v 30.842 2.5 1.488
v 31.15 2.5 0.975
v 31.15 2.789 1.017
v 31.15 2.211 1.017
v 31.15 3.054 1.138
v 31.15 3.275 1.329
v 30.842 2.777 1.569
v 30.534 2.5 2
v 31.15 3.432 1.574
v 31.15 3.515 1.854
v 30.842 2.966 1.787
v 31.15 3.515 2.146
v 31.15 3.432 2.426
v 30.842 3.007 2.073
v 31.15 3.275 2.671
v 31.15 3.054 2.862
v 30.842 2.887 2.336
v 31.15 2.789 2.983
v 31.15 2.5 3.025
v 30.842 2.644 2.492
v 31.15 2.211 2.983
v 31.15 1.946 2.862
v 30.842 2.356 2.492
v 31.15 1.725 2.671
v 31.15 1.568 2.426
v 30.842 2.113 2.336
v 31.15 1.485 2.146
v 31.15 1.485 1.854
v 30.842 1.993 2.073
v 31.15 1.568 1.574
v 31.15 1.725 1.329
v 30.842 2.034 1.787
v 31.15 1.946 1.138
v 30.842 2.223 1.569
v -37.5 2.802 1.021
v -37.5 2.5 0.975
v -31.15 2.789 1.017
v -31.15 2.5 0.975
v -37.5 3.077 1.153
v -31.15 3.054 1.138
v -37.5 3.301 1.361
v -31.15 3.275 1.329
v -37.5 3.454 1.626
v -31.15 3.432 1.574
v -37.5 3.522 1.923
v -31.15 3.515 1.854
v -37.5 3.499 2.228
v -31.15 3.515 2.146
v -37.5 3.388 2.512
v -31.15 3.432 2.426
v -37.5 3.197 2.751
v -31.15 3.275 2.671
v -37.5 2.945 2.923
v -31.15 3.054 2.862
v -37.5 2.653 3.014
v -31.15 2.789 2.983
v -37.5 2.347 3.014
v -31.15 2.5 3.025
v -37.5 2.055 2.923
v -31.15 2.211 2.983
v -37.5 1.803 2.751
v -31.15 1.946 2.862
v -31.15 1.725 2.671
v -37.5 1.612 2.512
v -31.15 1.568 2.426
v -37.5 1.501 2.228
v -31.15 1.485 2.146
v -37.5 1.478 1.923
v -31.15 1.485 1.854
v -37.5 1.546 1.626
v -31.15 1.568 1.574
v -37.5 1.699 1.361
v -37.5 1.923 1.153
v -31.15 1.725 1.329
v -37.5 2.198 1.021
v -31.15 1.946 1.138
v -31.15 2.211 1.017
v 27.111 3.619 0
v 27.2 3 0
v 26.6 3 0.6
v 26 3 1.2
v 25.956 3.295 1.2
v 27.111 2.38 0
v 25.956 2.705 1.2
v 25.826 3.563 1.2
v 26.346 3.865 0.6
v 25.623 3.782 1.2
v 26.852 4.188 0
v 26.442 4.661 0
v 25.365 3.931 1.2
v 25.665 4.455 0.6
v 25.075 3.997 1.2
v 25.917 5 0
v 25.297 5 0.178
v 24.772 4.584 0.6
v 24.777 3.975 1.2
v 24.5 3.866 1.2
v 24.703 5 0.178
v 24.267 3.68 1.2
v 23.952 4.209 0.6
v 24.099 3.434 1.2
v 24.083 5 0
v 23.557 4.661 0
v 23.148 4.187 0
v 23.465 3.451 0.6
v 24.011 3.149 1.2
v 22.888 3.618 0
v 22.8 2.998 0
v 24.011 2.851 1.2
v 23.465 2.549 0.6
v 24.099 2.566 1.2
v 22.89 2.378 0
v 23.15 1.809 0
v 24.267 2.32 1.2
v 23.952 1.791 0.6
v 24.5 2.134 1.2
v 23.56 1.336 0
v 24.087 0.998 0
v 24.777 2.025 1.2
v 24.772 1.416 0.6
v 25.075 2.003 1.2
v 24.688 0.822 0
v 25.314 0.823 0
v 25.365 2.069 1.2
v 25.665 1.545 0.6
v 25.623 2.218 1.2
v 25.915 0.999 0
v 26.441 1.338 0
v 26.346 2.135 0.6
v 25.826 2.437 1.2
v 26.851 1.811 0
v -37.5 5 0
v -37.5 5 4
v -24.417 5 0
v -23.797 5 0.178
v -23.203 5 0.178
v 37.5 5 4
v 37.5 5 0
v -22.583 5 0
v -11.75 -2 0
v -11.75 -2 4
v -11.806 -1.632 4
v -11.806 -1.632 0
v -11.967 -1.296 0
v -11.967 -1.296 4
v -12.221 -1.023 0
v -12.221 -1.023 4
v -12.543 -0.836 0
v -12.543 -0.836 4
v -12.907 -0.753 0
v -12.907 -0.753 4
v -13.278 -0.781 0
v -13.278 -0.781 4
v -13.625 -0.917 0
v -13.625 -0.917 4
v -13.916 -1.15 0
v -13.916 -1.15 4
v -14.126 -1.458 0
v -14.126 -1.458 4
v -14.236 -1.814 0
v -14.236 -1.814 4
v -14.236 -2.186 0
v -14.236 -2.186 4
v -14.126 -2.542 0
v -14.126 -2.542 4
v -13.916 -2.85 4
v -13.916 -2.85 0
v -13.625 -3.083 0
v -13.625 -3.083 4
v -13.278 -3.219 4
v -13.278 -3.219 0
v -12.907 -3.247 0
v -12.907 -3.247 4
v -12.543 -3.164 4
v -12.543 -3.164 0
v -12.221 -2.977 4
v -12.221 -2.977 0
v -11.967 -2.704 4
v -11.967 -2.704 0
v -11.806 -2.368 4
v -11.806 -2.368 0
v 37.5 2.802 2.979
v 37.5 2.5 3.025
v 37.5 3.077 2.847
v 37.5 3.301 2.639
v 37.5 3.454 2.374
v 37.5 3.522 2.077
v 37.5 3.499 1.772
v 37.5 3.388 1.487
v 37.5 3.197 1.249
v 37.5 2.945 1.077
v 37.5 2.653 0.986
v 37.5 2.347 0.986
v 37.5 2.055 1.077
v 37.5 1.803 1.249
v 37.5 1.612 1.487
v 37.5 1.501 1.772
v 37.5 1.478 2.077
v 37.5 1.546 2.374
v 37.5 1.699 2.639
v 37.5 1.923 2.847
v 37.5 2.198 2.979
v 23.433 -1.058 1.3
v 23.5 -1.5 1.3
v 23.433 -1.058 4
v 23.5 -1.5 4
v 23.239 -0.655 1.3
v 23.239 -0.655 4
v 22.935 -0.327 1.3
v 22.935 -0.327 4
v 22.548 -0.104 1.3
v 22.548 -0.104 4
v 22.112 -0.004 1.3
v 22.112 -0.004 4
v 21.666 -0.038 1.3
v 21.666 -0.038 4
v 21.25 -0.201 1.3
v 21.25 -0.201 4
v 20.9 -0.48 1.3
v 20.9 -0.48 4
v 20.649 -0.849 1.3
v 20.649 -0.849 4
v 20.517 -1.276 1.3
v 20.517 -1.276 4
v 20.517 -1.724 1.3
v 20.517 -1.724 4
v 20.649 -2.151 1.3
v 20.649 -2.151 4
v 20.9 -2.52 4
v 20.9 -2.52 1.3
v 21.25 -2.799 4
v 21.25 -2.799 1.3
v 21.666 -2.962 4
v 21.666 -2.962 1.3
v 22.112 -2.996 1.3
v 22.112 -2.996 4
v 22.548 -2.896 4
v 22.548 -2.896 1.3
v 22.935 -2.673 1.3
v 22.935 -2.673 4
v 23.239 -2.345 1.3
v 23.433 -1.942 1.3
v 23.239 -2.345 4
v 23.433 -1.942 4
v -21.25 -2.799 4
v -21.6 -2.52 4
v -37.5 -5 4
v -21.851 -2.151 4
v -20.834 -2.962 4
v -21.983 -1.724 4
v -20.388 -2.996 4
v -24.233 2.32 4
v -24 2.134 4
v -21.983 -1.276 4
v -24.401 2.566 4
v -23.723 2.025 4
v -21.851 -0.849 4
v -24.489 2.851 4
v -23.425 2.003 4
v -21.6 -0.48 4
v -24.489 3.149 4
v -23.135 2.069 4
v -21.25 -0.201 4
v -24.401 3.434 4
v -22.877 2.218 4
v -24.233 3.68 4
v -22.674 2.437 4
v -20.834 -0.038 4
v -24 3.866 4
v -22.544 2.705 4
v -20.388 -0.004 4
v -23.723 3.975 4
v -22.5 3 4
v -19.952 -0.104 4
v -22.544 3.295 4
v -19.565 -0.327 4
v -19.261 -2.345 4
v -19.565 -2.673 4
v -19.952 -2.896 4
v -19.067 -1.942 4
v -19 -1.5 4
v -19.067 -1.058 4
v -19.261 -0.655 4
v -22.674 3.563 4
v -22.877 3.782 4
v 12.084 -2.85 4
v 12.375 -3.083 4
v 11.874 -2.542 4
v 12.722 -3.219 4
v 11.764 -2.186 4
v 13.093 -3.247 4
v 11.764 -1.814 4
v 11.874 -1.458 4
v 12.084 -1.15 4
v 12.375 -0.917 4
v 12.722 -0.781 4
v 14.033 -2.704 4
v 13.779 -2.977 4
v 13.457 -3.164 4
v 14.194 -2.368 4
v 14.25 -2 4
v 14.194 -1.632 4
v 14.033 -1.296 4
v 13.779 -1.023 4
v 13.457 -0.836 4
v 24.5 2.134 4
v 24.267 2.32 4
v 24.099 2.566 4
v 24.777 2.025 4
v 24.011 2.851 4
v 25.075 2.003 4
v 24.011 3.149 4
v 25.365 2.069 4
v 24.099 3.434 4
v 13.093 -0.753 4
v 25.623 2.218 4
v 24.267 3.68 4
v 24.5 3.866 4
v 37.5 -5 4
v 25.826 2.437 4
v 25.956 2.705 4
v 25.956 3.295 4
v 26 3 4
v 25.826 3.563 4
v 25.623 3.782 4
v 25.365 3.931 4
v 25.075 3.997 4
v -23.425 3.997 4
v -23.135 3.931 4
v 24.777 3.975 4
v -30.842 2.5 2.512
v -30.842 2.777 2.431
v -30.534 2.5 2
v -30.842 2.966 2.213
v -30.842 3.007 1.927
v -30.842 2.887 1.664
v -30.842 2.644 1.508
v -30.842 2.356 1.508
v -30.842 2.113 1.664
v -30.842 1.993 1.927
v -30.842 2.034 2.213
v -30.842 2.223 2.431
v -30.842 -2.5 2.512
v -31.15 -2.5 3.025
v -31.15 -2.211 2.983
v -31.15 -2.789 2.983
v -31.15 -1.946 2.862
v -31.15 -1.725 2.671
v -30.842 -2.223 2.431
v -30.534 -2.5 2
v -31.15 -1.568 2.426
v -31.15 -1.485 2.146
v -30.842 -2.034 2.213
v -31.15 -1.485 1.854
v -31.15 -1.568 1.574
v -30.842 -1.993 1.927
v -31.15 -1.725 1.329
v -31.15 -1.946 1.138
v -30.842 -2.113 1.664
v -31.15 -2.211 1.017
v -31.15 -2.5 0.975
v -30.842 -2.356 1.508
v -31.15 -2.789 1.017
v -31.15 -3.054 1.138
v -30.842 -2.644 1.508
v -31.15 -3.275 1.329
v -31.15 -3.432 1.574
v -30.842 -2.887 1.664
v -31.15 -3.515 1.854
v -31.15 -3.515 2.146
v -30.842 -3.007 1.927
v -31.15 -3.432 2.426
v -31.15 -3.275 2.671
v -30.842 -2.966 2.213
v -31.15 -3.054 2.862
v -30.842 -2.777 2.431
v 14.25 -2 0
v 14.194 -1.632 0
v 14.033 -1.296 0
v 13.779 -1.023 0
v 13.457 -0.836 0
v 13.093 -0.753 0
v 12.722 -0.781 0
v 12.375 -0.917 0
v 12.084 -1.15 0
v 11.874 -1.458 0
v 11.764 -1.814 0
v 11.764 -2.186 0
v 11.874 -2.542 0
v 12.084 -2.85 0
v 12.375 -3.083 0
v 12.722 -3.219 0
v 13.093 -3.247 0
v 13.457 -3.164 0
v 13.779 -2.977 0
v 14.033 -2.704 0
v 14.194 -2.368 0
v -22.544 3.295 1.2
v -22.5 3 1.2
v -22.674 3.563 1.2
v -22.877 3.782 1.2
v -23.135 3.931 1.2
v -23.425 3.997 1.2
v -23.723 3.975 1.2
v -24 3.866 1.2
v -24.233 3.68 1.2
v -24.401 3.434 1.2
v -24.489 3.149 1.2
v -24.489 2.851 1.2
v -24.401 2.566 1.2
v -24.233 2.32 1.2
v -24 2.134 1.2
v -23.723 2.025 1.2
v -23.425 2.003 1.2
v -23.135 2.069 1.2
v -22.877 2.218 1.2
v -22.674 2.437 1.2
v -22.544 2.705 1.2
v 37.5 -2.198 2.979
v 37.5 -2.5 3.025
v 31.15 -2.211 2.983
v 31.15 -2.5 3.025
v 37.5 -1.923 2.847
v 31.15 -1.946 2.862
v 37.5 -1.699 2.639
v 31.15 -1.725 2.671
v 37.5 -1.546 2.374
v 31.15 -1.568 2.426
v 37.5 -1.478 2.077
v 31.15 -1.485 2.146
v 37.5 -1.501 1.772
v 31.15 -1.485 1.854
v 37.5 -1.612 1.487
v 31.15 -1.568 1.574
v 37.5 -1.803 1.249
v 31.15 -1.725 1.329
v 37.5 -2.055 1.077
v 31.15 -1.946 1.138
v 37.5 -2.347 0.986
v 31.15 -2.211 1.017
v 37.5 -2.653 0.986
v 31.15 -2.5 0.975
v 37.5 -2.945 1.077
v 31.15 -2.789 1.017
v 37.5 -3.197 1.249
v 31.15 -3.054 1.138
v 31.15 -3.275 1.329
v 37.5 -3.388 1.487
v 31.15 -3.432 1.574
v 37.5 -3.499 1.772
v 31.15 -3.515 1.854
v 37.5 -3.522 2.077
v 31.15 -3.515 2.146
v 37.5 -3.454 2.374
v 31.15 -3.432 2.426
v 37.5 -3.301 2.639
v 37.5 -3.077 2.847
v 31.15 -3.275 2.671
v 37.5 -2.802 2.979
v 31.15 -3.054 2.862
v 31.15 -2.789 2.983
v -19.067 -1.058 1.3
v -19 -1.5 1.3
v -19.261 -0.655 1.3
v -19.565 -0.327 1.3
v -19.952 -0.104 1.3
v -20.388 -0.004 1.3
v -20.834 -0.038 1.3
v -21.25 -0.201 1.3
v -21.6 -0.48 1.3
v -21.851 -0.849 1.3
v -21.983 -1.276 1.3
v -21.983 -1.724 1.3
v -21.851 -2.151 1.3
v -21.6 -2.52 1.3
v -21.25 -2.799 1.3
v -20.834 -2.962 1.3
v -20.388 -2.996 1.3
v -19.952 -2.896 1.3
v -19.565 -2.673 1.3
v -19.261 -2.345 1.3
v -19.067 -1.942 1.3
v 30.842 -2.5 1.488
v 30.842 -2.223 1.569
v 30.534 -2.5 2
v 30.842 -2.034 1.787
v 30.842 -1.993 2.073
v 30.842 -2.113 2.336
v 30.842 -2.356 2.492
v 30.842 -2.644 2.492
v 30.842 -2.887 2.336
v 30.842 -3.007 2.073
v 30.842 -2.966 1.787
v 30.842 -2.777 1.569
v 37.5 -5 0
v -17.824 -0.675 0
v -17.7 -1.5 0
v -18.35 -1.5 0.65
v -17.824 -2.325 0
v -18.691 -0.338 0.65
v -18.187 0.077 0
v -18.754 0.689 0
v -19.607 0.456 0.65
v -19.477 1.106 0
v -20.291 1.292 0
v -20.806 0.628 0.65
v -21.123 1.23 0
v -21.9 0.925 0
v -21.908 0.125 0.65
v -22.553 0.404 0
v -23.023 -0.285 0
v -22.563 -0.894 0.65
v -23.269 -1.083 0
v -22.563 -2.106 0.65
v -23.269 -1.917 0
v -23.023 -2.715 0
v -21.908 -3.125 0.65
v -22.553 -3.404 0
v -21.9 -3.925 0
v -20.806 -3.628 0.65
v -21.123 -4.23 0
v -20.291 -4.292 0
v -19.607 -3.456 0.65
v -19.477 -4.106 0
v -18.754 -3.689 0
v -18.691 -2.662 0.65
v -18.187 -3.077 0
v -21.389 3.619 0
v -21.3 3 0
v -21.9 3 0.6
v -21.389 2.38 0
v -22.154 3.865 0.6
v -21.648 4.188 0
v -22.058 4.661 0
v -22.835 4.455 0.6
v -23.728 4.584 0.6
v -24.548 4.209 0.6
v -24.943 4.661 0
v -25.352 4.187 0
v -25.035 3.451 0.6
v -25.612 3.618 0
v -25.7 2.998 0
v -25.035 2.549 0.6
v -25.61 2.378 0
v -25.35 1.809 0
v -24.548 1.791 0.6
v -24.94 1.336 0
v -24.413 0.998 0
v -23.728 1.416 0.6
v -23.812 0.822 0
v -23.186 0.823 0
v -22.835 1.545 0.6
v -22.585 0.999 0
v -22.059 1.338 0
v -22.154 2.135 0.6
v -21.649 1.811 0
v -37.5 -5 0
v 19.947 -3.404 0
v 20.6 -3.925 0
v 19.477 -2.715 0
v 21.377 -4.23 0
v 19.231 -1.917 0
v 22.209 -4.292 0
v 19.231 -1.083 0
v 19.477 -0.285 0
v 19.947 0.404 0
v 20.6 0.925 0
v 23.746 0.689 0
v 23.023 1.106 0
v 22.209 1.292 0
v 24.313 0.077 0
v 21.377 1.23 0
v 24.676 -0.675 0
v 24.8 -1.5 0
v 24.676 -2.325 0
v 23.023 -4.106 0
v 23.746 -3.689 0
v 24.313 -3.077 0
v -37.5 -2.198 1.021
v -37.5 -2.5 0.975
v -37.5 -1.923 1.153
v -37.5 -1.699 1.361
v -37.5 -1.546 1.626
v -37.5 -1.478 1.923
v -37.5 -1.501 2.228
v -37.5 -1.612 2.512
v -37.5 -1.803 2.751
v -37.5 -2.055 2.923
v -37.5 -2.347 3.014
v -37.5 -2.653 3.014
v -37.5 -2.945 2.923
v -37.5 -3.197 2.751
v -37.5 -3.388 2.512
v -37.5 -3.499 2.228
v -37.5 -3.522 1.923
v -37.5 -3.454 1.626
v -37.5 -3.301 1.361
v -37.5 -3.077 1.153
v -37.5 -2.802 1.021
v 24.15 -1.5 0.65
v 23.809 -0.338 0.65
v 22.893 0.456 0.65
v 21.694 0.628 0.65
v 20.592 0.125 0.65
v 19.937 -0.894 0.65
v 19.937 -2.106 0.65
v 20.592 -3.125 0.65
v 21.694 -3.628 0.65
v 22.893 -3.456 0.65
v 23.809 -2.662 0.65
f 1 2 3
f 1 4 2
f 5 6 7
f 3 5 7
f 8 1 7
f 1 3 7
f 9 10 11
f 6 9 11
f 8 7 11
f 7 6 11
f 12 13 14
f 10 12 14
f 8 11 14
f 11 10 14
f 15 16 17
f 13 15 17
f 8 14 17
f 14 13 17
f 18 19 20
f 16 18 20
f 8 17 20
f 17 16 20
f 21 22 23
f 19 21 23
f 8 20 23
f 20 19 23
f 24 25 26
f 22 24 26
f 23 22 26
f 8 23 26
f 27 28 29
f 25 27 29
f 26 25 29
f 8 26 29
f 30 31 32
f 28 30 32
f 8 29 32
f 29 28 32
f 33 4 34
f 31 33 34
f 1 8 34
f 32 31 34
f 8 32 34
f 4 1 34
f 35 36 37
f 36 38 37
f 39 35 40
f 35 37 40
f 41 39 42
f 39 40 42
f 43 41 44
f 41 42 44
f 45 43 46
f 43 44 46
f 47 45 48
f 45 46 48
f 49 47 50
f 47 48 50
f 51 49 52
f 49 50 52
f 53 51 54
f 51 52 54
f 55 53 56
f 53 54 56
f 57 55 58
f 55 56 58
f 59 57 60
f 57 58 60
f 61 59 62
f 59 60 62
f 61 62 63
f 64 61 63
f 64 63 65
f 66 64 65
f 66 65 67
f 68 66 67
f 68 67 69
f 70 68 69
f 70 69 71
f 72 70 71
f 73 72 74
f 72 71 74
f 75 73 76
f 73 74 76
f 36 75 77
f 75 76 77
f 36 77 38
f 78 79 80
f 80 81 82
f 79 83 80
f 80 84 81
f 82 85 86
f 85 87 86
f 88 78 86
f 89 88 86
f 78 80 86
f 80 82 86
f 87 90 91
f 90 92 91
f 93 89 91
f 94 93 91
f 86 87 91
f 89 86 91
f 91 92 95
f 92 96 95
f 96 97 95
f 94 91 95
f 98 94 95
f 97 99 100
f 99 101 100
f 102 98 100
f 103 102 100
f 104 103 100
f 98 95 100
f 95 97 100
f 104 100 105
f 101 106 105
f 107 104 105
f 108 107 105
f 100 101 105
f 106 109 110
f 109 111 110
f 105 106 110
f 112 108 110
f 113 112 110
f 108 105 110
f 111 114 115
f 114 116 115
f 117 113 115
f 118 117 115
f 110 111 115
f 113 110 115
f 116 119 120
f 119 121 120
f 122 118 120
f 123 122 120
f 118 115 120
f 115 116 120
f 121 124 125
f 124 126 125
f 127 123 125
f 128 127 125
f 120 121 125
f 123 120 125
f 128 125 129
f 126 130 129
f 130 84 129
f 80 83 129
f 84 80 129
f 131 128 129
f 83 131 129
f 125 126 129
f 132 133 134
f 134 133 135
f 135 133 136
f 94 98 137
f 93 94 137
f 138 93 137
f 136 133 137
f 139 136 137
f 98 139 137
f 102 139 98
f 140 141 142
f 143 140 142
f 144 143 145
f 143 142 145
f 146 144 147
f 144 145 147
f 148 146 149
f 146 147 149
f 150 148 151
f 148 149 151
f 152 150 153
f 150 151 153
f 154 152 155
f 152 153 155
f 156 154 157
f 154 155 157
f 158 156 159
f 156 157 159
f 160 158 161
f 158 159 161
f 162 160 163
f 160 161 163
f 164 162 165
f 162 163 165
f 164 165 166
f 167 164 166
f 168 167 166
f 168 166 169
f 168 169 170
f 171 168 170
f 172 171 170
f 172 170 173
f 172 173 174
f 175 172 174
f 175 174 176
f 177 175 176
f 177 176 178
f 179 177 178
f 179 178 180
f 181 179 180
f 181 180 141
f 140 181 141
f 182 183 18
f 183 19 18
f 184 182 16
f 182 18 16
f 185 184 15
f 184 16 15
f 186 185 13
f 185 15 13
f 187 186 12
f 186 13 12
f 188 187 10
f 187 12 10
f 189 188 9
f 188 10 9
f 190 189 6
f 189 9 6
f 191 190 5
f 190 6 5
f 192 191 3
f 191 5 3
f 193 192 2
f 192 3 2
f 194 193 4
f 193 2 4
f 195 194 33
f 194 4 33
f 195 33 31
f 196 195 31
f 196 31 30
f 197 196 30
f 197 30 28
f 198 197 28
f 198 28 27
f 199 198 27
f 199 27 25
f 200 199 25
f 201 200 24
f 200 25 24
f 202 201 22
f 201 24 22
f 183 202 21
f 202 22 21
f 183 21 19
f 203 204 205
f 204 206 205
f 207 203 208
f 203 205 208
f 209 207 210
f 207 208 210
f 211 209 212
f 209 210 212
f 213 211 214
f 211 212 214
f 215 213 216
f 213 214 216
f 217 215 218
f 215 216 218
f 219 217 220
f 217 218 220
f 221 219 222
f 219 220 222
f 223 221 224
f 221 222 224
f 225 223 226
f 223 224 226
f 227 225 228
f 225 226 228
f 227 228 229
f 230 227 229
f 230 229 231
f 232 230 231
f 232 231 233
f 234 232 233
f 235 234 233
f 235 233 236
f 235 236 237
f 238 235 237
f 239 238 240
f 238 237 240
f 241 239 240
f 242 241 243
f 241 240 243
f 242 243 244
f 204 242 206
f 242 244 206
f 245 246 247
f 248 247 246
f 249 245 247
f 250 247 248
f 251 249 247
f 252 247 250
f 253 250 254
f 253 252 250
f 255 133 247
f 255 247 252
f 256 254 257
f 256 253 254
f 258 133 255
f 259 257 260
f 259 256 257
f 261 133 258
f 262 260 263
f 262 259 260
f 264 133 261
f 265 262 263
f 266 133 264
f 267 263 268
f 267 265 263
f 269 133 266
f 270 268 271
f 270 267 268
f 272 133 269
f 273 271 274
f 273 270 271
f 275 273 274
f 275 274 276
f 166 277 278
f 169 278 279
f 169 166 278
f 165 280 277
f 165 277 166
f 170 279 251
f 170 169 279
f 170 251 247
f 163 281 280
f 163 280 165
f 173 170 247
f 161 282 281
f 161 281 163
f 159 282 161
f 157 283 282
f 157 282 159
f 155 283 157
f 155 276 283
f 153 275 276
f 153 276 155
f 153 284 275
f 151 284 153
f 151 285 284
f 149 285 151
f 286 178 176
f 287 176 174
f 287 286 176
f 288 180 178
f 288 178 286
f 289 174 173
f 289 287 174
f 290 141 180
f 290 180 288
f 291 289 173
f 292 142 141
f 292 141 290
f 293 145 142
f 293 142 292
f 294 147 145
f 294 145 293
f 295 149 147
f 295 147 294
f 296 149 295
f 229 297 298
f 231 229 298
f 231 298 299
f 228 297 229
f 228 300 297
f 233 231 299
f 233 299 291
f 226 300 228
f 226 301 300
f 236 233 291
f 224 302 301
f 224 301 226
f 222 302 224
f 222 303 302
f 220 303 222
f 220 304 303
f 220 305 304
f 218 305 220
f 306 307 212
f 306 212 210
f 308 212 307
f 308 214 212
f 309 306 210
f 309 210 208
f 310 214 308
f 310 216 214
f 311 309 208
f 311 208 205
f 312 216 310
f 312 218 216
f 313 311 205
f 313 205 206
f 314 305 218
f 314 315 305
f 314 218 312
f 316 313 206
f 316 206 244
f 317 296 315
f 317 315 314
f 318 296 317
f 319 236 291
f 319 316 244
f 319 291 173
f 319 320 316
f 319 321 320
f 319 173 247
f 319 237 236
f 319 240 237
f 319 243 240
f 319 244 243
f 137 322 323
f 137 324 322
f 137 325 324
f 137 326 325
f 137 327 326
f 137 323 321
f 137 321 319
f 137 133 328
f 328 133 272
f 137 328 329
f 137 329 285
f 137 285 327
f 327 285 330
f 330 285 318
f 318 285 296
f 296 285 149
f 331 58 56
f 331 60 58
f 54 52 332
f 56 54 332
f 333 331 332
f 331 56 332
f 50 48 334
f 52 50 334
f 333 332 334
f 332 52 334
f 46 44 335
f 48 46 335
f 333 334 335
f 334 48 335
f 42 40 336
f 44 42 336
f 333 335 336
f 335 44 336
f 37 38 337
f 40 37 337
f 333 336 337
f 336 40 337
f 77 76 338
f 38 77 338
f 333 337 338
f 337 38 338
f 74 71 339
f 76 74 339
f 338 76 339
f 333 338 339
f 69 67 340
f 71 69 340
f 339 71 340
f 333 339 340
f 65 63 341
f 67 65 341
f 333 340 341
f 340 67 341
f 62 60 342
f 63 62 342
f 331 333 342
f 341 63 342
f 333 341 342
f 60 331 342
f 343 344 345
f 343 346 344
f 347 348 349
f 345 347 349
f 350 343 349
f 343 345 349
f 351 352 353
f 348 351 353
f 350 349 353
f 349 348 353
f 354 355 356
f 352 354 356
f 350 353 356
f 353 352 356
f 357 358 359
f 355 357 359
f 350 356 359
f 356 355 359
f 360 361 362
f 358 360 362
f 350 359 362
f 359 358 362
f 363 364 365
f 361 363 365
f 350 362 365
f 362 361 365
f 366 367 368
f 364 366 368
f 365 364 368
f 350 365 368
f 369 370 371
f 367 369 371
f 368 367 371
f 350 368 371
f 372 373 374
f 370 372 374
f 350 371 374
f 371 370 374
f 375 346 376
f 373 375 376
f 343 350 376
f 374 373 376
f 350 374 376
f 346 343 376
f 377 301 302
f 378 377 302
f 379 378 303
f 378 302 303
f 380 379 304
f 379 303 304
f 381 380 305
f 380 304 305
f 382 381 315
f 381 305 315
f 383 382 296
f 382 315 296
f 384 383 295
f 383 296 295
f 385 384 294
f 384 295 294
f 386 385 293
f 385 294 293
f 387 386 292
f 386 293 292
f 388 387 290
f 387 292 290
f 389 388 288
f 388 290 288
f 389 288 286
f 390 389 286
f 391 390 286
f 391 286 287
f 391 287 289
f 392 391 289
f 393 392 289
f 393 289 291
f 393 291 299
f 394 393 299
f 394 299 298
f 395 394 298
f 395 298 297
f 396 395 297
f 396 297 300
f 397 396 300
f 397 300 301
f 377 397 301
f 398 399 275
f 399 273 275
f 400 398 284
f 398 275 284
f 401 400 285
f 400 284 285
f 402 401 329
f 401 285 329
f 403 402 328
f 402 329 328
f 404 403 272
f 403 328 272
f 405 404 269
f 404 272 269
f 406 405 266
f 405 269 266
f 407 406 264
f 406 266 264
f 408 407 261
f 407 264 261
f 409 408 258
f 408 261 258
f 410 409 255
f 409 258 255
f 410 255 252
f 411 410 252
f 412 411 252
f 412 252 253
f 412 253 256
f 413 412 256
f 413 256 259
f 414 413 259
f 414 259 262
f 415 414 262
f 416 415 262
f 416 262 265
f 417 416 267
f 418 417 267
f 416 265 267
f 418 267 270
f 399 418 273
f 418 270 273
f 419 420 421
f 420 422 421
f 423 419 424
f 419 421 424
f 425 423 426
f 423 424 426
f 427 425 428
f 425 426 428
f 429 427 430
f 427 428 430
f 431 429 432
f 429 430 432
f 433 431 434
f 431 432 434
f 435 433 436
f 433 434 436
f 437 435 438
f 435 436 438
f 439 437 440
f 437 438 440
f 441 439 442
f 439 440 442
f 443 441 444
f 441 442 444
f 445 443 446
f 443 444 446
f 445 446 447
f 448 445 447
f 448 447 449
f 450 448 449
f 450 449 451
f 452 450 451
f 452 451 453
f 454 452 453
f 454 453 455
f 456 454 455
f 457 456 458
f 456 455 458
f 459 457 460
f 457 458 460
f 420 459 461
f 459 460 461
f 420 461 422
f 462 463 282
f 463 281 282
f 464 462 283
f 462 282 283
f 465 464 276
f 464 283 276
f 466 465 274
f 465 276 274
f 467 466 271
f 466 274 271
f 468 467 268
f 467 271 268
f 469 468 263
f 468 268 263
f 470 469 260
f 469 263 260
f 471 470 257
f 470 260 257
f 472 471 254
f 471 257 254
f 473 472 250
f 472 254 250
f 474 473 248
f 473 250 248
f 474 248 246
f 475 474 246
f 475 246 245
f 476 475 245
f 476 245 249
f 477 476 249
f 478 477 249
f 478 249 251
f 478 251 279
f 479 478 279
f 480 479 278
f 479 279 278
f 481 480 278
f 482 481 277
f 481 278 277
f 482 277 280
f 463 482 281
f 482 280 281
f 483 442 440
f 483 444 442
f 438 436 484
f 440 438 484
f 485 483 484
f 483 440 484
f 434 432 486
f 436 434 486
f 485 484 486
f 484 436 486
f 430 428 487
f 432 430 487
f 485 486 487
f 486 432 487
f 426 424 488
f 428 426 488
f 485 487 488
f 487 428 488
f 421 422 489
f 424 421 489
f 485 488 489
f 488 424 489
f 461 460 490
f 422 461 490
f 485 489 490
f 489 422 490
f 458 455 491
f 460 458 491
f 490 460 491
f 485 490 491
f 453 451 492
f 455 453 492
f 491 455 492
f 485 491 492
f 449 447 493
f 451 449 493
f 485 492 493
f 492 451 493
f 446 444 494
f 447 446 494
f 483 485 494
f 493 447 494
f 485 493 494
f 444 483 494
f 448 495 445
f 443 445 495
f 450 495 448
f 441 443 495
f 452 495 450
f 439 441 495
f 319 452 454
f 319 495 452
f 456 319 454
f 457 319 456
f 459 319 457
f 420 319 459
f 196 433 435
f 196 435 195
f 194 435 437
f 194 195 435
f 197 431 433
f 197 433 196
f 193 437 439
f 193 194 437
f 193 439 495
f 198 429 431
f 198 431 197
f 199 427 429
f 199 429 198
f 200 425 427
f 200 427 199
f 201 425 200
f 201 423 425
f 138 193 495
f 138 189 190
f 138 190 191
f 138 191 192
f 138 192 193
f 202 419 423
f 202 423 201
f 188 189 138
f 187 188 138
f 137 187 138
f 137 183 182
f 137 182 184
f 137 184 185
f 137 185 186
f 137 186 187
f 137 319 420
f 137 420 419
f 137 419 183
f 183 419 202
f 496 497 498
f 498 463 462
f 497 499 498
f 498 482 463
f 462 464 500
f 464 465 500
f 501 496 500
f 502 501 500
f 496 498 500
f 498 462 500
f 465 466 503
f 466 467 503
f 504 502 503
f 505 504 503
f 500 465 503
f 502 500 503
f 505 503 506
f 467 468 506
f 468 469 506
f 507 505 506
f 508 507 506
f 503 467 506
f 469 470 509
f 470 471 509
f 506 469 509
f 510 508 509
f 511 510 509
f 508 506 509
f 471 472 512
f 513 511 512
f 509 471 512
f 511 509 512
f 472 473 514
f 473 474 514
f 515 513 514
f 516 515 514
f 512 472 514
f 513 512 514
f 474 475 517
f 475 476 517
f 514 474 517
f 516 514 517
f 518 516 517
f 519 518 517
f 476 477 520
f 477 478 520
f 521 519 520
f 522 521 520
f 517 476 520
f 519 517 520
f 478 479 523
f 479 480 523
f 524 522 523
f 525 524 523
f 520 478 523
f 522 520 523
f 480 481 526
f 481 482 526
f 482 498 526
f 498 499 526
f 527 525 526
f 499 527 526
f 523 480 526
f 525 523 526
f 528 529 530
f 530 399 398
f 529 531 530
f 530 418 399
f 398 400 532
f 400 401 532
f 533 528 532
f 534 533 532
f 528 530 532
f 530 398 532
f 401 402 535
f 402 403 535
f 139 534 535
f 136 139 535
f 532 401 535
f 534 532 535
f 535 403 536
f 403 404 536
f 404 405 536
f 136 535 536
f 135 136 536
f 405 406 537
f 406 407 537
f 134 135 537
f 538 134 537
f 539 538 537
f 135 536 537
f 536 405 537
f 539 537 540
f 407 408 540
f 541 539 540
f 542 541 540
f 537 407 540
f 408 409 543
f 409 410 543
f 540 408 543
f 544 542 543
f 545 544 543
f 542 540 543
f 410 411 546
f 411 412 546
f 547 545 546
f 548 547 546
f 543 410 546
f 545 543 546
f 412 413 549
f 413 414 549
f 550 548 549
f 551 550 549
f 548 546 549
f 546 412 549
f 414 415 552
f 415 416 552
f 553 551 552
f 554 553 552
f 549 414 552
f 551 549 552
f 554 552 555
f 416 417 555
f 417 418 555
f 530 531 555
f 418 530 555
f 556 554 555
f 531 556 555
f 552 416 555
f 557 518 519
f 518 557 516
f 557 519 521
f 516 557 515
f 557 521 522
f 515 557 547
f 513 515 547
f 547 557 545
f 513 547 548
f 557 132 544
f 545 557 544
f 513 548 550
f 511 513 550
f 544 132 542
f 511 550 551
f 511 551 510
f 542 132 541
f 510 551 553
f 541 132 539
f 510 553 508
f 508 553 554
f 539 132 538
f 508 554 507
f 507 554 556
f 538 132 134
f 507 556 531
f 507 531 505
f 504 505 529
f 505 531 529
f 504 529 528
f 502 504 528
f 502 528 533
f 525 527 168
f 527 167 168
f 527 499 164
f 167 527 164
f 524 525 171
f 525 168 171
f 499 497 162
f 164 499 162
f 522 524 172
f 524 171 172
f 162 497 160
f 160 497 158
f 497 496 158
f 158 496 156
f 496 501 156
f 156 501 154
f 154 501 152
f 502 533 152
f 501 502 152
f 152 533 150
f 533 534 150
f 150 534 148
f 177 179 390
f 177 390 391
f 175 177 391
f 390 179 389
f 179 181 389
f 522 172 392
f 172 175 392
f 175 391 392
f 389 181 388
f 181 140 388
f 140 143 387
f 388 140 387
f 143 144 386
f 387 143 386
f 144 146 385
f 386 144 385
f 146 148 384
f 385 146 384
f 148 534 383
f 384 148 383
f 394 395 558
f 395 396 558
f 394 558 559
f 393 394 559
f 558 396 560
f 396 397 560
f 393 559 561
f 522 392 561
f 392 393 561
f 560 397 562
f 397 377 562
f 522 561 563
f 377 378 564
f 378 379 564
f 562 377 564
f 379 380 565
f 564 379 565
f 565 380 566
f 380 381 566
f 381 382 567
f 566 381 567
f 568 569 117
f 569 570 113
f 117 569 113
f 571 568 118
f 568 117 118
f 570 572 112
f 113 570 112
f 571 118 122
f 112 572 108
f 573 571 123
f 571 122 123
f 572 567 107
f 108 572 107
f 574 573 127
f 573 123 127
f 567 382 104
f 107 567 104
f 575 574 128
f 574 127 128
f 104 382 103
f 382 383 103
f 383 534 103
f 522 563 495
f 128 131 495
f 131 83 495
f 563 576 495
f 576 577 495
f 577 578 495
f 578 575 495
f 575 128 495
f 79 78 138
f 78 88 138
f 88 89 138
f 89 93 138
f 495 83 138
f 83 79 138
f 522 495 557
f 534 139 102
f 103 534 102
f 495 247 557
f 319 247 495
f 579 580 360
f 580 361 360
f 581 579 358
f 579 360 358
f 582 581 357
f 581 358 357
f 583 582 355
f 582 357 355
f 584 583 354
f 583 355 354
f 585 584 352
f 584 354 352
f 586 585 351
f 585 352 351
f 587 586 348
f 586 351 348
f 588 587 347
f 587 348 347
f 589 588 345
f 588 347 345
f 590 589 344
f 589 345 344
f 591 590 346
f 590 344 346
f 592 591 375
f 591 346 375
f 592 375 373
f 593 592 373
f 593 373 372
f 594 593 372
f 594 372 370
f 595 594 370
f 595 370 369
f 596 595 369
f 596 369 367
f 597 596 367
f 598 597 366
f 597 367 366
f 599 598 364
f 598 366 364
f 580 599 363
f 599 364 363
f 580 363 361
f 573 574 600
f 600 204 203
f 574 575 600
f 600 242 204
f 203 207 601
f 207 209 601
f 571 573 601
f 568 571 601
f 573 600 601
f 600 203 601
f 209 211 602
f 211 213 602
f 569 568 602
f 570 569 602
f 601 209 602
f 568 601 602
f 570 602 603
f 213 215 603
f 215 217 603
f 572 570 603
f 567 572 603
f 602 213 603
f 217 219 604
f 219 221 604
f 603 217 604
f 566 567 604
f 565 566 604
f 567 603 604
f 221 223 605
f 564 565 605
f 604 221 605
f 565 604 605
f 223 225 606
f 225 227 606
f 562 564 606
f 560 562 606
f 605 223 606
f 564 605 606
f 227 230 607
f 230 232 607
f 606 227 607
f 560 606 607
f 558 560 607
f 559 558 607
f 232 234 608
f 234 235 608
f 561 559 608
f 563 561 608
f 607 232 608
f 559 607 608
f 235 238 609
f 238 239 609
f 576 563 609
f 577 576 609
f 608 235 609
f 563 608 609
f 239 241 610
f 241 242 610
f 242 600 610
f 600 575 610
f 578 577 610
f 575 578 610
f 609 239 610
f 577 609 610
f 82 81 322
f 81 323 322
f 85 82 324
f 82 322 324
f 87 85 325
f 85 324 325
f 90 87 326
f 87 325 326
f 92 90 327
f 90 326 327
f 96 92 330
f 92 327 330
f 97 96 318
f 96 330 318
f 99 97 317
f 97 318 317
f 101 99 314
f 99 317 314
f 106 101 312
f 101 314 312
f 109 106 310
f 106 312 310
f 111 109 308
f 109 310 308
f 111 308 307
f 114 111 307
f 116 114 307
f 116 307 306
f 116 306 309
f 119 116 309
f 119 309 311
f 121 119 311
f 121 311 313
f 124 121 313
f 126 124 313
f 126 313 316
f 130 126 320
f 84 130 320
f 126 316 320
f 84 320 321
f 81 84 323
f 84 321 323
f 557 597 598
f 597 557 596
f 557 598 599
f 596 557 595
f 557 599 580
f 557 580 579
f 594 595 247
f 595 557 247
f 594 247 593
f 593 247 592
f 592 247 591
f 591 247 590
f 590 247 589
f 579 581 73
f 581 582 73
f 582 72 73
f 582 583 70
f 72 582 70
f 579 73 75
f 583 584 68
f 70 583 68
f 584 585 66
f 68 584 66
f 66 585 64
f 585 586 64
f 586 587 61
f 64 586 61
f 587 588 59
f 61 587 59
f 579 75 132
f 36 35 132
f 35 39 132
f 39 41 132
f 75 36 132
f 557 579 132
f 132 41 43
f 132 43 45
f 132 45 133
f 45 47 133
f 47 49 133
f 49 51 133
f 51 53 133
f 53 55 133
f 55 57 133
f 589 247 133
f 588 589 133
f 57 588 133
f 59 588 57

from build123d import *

# Parameters (mm, degrees)
SKETCH1_W                     = 75
SKETCH1_H                     = 10
BOSS_EXTRUDE1_DEPTH           = 4
M3X0_5_TAPPED_HOLE1_D         = 2.5
CSK_FOR_M3_SFHCS1_D           = 3
CSK_FOR_M3_SFHCS1_CSINK_D     = 5.6
CSK_FOR_M3_SFHCS1_CSINK_ANGLE = 90
CSK_FOR_M3_SFHCS2_D           = 2
CSK_FOR_M3_SFHCS2_CSINK_D     = 4.4
CSK_FOR_M3_SFHCS2_CSINK_ANGLE = 90
M2_5X0_45_TAPPED_HOLE1_D      = 2.05
M2_5X0_45_TAPPED_HOLE1_DEPTH  = 6.35
M2_5X0_45_TAPPED_HOLE1_TIP    = 0.615882135
M2_5X0_45_TAPPED_HOLE2_D      = 2.05
M2_5X0_45_TAPPED_HOLE2_DEPTH  = 6.35
M2_5X0_45_TAPPED_HOLE2_TIP    = 0.615882135


with BuildPart() as part:
    # Sketch1 → Boss-Extrude1 (new body)
    with BuildSketch(Plane.XY.offset(4)):
        Rectangle(SKETCH1_W, SKETCH1_H)
    extrude(amount=-BOSS_EXTRUDE1_DEPTH)

    # M3x0.5 Tapped Hole1 (through all)
    with Locations(Plane(origin=(0, 0, 0), x_dir=(-1, 0, 0), z_dir=(0, 0, -1))):
        with Locations((-13, -2), (13, -2)):
            Hole(M3X0_5_TAPPED_HOLE1_D / 2)

    # CSK for M3 SFHCS1 (through all)
    with Locations(Plane(origin=(0, 0, 0), x_dir=(-1, 0, 0), z_dir=(0, 0, -1))):
        with Locations((-22, -1.5), (20.5, -1.5)):
            CounterSinkHole(CSK_FOR_M3_SFHCS1_D / 2, CSK_FOR_M3_SFHCS1_CSINK_D / 2, counter_sink_angle=CSK_FOR_M3_SFHCS1_CSINK_ANGLE)

    # CSK for M3 SFHCS2 (through all)
    with Locations(Plane(origin=(0, 0, 0), x_dir=(-1, 0, 0), z_dir=(0, 0, -1))):
        with Locations((23.5, 3), (-25, 3)):
            CounterSinkHole(CSK_FOR_M3_SFHCS2_D / 2, CSK_FOR_M3_SFHCS2_CSINK_D / 2, counter_sink_angle=CSK_FOR_M3_SFHCS2_CSINK_ANGLE)

    # M2.5x0.45 Tapped Hole1
    with Locations(Plane(origin=(37.5, 0, 0), x_dir=(0, 0, -1), z_dir=(1, 0, 0))):
        with Locations((-2, 2.5), (-2, -2.5)):
            Hole(M2_5X0_45_TAPPED_HOLE1_D / 2, depth=M2_5X0_45_TAPPED_HOLE1_DEPTH)
            with Locations((0, 0, -(M2_5X0_45_TAPPED_HOLE1_DEPTH + M2_5X0_45_TAPPED_HOLE1_TIP / 2))):  # 118° drill point
                Cone(0, M2_5X0_45_TAPPED_HOLE1_D / 2, M2_5X0_45_TAPPED_HOLE1_TIP, mode=Mode.SUBTRACT)

    # M2.5x0.45 Tapped Hole2
    with Locations(Plane.ZY.offset(37.5)):
        with Locations((2, -2.5), (2, 2.5)):
            Hole(M2_5X0_45_TAPPED_HOLE2_D / 2, depth=M2_5X0_45_TAPPED_HOLE2_DEPTH)
            with Locations((0, 0, -(M2_5X0_45_TAPPED_HOLE2_DEPTH + M2_5X0_45_TAPPED_HOLE2_TIP / 2))):  # 118° drill point
                Cone(0, M2_5X0_45_TAPPED_HOLE2_D / 2, M2_5X0_45_TAPPED_HOLE2_TIP, mode=Mode.SUBTRACT)


solid = part.part
